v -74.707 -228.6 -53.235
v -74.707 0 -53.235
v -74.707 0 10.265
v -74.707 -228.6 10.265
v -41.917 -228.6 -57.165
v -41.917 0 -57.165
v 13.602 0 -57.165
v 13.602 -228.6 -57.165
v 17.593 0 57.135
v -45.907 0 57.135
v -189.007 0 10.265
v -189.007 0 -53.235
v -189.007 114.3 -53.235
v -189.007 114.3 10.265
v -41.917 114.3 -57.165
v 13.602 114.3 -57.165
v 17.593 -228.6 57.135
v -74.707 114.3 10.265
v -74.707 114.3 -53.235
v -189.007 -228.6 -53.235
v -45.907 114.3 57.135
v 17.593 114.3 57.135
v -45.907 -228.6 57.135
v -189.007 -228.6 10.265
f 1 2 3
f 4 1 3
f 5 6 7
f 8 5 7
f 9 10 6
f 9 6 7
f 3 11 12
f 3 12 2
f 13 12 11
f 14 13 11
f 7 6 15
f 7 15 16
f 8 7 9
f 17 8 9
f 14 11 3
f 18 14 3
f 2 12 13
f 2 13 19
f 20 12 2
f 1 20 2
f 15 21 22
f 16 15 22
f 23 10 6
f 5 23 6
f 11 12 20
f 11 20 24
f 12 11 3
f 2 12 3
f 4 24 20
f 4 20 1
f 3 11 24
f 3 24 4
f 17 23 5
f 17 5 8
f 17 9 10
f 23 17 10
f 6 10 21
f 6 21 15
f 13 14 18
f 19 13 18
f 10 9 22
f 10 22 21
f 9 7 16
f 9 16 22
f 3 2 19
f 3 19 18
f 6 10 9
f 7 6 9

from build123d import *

# Parameters (mm, degrees)
F1_DEPTH = 228.6
F2_W     = 114.3
F2_H     = 63.5
F3_DEPTH = 228.6
F4_DEPTH = 114.3
F5_DEPTH = 114.3


with BuildPart() as f1:
    # F0 (on Front) → F1 (new body)
    with BuildSketch(Plane.XZ):
        Polygon((-14.1572295701, 57.1352146626), (-45.9072295701, 57.1352146626), (-41.9168895701, -57.1647853374), (-14.1572295701, -57.1647853374), align=None)
        Polygon((17.5927704299, 57.1352146626), (-14.1572295701, 57.1352146626), (-14.1572295701, -57.1647853374), (13.6024304299, -57.1647853374), align=None)
    extrude(amount=F1_DEPTH)


with BuildPart() as f3:
    # F2 (on Front) → F3 (new body)
    with BuildSketch(Plane.XZ):
        with Locations((-131.8571120501, -21.4845678326)):
            Rectangle(F2_W, F2_H)
    extrude(amount=F3_DEPTH)


with BuildPart() as f4:
    # F0 (on Front) → F4 (new body)
    with BuildSketch(Plane.XZ):
        Polygon((-14.1572295701, 57.1352146626), (-45.9072295701, 57.1352146626), (-41.9168895701, -57.1647853374), (-14.1572295701, -57.1647853374), align=None)
        Polygon((17.5927704299, 57.1352146626), (-14.1572295701, 57.1352146626), (-14.1572295701, -57.1647853374), (13.6024304299, -57.1647853374), align=None)
    extrude(amount=-F4_DEPTH)


with BuildPart() as f5:
    # F2 (on Front) → F5 (new body)
    with BuildSketch(Plane.XZ):
        with Locations((-131.8571120501, -21.4845678326)):
            Rectangle(F2_W, F2_H)
    extrude(amount=-F5_DEPTH)


solid = Compound([f1.part, f3.part, f4.part, f5.part])
